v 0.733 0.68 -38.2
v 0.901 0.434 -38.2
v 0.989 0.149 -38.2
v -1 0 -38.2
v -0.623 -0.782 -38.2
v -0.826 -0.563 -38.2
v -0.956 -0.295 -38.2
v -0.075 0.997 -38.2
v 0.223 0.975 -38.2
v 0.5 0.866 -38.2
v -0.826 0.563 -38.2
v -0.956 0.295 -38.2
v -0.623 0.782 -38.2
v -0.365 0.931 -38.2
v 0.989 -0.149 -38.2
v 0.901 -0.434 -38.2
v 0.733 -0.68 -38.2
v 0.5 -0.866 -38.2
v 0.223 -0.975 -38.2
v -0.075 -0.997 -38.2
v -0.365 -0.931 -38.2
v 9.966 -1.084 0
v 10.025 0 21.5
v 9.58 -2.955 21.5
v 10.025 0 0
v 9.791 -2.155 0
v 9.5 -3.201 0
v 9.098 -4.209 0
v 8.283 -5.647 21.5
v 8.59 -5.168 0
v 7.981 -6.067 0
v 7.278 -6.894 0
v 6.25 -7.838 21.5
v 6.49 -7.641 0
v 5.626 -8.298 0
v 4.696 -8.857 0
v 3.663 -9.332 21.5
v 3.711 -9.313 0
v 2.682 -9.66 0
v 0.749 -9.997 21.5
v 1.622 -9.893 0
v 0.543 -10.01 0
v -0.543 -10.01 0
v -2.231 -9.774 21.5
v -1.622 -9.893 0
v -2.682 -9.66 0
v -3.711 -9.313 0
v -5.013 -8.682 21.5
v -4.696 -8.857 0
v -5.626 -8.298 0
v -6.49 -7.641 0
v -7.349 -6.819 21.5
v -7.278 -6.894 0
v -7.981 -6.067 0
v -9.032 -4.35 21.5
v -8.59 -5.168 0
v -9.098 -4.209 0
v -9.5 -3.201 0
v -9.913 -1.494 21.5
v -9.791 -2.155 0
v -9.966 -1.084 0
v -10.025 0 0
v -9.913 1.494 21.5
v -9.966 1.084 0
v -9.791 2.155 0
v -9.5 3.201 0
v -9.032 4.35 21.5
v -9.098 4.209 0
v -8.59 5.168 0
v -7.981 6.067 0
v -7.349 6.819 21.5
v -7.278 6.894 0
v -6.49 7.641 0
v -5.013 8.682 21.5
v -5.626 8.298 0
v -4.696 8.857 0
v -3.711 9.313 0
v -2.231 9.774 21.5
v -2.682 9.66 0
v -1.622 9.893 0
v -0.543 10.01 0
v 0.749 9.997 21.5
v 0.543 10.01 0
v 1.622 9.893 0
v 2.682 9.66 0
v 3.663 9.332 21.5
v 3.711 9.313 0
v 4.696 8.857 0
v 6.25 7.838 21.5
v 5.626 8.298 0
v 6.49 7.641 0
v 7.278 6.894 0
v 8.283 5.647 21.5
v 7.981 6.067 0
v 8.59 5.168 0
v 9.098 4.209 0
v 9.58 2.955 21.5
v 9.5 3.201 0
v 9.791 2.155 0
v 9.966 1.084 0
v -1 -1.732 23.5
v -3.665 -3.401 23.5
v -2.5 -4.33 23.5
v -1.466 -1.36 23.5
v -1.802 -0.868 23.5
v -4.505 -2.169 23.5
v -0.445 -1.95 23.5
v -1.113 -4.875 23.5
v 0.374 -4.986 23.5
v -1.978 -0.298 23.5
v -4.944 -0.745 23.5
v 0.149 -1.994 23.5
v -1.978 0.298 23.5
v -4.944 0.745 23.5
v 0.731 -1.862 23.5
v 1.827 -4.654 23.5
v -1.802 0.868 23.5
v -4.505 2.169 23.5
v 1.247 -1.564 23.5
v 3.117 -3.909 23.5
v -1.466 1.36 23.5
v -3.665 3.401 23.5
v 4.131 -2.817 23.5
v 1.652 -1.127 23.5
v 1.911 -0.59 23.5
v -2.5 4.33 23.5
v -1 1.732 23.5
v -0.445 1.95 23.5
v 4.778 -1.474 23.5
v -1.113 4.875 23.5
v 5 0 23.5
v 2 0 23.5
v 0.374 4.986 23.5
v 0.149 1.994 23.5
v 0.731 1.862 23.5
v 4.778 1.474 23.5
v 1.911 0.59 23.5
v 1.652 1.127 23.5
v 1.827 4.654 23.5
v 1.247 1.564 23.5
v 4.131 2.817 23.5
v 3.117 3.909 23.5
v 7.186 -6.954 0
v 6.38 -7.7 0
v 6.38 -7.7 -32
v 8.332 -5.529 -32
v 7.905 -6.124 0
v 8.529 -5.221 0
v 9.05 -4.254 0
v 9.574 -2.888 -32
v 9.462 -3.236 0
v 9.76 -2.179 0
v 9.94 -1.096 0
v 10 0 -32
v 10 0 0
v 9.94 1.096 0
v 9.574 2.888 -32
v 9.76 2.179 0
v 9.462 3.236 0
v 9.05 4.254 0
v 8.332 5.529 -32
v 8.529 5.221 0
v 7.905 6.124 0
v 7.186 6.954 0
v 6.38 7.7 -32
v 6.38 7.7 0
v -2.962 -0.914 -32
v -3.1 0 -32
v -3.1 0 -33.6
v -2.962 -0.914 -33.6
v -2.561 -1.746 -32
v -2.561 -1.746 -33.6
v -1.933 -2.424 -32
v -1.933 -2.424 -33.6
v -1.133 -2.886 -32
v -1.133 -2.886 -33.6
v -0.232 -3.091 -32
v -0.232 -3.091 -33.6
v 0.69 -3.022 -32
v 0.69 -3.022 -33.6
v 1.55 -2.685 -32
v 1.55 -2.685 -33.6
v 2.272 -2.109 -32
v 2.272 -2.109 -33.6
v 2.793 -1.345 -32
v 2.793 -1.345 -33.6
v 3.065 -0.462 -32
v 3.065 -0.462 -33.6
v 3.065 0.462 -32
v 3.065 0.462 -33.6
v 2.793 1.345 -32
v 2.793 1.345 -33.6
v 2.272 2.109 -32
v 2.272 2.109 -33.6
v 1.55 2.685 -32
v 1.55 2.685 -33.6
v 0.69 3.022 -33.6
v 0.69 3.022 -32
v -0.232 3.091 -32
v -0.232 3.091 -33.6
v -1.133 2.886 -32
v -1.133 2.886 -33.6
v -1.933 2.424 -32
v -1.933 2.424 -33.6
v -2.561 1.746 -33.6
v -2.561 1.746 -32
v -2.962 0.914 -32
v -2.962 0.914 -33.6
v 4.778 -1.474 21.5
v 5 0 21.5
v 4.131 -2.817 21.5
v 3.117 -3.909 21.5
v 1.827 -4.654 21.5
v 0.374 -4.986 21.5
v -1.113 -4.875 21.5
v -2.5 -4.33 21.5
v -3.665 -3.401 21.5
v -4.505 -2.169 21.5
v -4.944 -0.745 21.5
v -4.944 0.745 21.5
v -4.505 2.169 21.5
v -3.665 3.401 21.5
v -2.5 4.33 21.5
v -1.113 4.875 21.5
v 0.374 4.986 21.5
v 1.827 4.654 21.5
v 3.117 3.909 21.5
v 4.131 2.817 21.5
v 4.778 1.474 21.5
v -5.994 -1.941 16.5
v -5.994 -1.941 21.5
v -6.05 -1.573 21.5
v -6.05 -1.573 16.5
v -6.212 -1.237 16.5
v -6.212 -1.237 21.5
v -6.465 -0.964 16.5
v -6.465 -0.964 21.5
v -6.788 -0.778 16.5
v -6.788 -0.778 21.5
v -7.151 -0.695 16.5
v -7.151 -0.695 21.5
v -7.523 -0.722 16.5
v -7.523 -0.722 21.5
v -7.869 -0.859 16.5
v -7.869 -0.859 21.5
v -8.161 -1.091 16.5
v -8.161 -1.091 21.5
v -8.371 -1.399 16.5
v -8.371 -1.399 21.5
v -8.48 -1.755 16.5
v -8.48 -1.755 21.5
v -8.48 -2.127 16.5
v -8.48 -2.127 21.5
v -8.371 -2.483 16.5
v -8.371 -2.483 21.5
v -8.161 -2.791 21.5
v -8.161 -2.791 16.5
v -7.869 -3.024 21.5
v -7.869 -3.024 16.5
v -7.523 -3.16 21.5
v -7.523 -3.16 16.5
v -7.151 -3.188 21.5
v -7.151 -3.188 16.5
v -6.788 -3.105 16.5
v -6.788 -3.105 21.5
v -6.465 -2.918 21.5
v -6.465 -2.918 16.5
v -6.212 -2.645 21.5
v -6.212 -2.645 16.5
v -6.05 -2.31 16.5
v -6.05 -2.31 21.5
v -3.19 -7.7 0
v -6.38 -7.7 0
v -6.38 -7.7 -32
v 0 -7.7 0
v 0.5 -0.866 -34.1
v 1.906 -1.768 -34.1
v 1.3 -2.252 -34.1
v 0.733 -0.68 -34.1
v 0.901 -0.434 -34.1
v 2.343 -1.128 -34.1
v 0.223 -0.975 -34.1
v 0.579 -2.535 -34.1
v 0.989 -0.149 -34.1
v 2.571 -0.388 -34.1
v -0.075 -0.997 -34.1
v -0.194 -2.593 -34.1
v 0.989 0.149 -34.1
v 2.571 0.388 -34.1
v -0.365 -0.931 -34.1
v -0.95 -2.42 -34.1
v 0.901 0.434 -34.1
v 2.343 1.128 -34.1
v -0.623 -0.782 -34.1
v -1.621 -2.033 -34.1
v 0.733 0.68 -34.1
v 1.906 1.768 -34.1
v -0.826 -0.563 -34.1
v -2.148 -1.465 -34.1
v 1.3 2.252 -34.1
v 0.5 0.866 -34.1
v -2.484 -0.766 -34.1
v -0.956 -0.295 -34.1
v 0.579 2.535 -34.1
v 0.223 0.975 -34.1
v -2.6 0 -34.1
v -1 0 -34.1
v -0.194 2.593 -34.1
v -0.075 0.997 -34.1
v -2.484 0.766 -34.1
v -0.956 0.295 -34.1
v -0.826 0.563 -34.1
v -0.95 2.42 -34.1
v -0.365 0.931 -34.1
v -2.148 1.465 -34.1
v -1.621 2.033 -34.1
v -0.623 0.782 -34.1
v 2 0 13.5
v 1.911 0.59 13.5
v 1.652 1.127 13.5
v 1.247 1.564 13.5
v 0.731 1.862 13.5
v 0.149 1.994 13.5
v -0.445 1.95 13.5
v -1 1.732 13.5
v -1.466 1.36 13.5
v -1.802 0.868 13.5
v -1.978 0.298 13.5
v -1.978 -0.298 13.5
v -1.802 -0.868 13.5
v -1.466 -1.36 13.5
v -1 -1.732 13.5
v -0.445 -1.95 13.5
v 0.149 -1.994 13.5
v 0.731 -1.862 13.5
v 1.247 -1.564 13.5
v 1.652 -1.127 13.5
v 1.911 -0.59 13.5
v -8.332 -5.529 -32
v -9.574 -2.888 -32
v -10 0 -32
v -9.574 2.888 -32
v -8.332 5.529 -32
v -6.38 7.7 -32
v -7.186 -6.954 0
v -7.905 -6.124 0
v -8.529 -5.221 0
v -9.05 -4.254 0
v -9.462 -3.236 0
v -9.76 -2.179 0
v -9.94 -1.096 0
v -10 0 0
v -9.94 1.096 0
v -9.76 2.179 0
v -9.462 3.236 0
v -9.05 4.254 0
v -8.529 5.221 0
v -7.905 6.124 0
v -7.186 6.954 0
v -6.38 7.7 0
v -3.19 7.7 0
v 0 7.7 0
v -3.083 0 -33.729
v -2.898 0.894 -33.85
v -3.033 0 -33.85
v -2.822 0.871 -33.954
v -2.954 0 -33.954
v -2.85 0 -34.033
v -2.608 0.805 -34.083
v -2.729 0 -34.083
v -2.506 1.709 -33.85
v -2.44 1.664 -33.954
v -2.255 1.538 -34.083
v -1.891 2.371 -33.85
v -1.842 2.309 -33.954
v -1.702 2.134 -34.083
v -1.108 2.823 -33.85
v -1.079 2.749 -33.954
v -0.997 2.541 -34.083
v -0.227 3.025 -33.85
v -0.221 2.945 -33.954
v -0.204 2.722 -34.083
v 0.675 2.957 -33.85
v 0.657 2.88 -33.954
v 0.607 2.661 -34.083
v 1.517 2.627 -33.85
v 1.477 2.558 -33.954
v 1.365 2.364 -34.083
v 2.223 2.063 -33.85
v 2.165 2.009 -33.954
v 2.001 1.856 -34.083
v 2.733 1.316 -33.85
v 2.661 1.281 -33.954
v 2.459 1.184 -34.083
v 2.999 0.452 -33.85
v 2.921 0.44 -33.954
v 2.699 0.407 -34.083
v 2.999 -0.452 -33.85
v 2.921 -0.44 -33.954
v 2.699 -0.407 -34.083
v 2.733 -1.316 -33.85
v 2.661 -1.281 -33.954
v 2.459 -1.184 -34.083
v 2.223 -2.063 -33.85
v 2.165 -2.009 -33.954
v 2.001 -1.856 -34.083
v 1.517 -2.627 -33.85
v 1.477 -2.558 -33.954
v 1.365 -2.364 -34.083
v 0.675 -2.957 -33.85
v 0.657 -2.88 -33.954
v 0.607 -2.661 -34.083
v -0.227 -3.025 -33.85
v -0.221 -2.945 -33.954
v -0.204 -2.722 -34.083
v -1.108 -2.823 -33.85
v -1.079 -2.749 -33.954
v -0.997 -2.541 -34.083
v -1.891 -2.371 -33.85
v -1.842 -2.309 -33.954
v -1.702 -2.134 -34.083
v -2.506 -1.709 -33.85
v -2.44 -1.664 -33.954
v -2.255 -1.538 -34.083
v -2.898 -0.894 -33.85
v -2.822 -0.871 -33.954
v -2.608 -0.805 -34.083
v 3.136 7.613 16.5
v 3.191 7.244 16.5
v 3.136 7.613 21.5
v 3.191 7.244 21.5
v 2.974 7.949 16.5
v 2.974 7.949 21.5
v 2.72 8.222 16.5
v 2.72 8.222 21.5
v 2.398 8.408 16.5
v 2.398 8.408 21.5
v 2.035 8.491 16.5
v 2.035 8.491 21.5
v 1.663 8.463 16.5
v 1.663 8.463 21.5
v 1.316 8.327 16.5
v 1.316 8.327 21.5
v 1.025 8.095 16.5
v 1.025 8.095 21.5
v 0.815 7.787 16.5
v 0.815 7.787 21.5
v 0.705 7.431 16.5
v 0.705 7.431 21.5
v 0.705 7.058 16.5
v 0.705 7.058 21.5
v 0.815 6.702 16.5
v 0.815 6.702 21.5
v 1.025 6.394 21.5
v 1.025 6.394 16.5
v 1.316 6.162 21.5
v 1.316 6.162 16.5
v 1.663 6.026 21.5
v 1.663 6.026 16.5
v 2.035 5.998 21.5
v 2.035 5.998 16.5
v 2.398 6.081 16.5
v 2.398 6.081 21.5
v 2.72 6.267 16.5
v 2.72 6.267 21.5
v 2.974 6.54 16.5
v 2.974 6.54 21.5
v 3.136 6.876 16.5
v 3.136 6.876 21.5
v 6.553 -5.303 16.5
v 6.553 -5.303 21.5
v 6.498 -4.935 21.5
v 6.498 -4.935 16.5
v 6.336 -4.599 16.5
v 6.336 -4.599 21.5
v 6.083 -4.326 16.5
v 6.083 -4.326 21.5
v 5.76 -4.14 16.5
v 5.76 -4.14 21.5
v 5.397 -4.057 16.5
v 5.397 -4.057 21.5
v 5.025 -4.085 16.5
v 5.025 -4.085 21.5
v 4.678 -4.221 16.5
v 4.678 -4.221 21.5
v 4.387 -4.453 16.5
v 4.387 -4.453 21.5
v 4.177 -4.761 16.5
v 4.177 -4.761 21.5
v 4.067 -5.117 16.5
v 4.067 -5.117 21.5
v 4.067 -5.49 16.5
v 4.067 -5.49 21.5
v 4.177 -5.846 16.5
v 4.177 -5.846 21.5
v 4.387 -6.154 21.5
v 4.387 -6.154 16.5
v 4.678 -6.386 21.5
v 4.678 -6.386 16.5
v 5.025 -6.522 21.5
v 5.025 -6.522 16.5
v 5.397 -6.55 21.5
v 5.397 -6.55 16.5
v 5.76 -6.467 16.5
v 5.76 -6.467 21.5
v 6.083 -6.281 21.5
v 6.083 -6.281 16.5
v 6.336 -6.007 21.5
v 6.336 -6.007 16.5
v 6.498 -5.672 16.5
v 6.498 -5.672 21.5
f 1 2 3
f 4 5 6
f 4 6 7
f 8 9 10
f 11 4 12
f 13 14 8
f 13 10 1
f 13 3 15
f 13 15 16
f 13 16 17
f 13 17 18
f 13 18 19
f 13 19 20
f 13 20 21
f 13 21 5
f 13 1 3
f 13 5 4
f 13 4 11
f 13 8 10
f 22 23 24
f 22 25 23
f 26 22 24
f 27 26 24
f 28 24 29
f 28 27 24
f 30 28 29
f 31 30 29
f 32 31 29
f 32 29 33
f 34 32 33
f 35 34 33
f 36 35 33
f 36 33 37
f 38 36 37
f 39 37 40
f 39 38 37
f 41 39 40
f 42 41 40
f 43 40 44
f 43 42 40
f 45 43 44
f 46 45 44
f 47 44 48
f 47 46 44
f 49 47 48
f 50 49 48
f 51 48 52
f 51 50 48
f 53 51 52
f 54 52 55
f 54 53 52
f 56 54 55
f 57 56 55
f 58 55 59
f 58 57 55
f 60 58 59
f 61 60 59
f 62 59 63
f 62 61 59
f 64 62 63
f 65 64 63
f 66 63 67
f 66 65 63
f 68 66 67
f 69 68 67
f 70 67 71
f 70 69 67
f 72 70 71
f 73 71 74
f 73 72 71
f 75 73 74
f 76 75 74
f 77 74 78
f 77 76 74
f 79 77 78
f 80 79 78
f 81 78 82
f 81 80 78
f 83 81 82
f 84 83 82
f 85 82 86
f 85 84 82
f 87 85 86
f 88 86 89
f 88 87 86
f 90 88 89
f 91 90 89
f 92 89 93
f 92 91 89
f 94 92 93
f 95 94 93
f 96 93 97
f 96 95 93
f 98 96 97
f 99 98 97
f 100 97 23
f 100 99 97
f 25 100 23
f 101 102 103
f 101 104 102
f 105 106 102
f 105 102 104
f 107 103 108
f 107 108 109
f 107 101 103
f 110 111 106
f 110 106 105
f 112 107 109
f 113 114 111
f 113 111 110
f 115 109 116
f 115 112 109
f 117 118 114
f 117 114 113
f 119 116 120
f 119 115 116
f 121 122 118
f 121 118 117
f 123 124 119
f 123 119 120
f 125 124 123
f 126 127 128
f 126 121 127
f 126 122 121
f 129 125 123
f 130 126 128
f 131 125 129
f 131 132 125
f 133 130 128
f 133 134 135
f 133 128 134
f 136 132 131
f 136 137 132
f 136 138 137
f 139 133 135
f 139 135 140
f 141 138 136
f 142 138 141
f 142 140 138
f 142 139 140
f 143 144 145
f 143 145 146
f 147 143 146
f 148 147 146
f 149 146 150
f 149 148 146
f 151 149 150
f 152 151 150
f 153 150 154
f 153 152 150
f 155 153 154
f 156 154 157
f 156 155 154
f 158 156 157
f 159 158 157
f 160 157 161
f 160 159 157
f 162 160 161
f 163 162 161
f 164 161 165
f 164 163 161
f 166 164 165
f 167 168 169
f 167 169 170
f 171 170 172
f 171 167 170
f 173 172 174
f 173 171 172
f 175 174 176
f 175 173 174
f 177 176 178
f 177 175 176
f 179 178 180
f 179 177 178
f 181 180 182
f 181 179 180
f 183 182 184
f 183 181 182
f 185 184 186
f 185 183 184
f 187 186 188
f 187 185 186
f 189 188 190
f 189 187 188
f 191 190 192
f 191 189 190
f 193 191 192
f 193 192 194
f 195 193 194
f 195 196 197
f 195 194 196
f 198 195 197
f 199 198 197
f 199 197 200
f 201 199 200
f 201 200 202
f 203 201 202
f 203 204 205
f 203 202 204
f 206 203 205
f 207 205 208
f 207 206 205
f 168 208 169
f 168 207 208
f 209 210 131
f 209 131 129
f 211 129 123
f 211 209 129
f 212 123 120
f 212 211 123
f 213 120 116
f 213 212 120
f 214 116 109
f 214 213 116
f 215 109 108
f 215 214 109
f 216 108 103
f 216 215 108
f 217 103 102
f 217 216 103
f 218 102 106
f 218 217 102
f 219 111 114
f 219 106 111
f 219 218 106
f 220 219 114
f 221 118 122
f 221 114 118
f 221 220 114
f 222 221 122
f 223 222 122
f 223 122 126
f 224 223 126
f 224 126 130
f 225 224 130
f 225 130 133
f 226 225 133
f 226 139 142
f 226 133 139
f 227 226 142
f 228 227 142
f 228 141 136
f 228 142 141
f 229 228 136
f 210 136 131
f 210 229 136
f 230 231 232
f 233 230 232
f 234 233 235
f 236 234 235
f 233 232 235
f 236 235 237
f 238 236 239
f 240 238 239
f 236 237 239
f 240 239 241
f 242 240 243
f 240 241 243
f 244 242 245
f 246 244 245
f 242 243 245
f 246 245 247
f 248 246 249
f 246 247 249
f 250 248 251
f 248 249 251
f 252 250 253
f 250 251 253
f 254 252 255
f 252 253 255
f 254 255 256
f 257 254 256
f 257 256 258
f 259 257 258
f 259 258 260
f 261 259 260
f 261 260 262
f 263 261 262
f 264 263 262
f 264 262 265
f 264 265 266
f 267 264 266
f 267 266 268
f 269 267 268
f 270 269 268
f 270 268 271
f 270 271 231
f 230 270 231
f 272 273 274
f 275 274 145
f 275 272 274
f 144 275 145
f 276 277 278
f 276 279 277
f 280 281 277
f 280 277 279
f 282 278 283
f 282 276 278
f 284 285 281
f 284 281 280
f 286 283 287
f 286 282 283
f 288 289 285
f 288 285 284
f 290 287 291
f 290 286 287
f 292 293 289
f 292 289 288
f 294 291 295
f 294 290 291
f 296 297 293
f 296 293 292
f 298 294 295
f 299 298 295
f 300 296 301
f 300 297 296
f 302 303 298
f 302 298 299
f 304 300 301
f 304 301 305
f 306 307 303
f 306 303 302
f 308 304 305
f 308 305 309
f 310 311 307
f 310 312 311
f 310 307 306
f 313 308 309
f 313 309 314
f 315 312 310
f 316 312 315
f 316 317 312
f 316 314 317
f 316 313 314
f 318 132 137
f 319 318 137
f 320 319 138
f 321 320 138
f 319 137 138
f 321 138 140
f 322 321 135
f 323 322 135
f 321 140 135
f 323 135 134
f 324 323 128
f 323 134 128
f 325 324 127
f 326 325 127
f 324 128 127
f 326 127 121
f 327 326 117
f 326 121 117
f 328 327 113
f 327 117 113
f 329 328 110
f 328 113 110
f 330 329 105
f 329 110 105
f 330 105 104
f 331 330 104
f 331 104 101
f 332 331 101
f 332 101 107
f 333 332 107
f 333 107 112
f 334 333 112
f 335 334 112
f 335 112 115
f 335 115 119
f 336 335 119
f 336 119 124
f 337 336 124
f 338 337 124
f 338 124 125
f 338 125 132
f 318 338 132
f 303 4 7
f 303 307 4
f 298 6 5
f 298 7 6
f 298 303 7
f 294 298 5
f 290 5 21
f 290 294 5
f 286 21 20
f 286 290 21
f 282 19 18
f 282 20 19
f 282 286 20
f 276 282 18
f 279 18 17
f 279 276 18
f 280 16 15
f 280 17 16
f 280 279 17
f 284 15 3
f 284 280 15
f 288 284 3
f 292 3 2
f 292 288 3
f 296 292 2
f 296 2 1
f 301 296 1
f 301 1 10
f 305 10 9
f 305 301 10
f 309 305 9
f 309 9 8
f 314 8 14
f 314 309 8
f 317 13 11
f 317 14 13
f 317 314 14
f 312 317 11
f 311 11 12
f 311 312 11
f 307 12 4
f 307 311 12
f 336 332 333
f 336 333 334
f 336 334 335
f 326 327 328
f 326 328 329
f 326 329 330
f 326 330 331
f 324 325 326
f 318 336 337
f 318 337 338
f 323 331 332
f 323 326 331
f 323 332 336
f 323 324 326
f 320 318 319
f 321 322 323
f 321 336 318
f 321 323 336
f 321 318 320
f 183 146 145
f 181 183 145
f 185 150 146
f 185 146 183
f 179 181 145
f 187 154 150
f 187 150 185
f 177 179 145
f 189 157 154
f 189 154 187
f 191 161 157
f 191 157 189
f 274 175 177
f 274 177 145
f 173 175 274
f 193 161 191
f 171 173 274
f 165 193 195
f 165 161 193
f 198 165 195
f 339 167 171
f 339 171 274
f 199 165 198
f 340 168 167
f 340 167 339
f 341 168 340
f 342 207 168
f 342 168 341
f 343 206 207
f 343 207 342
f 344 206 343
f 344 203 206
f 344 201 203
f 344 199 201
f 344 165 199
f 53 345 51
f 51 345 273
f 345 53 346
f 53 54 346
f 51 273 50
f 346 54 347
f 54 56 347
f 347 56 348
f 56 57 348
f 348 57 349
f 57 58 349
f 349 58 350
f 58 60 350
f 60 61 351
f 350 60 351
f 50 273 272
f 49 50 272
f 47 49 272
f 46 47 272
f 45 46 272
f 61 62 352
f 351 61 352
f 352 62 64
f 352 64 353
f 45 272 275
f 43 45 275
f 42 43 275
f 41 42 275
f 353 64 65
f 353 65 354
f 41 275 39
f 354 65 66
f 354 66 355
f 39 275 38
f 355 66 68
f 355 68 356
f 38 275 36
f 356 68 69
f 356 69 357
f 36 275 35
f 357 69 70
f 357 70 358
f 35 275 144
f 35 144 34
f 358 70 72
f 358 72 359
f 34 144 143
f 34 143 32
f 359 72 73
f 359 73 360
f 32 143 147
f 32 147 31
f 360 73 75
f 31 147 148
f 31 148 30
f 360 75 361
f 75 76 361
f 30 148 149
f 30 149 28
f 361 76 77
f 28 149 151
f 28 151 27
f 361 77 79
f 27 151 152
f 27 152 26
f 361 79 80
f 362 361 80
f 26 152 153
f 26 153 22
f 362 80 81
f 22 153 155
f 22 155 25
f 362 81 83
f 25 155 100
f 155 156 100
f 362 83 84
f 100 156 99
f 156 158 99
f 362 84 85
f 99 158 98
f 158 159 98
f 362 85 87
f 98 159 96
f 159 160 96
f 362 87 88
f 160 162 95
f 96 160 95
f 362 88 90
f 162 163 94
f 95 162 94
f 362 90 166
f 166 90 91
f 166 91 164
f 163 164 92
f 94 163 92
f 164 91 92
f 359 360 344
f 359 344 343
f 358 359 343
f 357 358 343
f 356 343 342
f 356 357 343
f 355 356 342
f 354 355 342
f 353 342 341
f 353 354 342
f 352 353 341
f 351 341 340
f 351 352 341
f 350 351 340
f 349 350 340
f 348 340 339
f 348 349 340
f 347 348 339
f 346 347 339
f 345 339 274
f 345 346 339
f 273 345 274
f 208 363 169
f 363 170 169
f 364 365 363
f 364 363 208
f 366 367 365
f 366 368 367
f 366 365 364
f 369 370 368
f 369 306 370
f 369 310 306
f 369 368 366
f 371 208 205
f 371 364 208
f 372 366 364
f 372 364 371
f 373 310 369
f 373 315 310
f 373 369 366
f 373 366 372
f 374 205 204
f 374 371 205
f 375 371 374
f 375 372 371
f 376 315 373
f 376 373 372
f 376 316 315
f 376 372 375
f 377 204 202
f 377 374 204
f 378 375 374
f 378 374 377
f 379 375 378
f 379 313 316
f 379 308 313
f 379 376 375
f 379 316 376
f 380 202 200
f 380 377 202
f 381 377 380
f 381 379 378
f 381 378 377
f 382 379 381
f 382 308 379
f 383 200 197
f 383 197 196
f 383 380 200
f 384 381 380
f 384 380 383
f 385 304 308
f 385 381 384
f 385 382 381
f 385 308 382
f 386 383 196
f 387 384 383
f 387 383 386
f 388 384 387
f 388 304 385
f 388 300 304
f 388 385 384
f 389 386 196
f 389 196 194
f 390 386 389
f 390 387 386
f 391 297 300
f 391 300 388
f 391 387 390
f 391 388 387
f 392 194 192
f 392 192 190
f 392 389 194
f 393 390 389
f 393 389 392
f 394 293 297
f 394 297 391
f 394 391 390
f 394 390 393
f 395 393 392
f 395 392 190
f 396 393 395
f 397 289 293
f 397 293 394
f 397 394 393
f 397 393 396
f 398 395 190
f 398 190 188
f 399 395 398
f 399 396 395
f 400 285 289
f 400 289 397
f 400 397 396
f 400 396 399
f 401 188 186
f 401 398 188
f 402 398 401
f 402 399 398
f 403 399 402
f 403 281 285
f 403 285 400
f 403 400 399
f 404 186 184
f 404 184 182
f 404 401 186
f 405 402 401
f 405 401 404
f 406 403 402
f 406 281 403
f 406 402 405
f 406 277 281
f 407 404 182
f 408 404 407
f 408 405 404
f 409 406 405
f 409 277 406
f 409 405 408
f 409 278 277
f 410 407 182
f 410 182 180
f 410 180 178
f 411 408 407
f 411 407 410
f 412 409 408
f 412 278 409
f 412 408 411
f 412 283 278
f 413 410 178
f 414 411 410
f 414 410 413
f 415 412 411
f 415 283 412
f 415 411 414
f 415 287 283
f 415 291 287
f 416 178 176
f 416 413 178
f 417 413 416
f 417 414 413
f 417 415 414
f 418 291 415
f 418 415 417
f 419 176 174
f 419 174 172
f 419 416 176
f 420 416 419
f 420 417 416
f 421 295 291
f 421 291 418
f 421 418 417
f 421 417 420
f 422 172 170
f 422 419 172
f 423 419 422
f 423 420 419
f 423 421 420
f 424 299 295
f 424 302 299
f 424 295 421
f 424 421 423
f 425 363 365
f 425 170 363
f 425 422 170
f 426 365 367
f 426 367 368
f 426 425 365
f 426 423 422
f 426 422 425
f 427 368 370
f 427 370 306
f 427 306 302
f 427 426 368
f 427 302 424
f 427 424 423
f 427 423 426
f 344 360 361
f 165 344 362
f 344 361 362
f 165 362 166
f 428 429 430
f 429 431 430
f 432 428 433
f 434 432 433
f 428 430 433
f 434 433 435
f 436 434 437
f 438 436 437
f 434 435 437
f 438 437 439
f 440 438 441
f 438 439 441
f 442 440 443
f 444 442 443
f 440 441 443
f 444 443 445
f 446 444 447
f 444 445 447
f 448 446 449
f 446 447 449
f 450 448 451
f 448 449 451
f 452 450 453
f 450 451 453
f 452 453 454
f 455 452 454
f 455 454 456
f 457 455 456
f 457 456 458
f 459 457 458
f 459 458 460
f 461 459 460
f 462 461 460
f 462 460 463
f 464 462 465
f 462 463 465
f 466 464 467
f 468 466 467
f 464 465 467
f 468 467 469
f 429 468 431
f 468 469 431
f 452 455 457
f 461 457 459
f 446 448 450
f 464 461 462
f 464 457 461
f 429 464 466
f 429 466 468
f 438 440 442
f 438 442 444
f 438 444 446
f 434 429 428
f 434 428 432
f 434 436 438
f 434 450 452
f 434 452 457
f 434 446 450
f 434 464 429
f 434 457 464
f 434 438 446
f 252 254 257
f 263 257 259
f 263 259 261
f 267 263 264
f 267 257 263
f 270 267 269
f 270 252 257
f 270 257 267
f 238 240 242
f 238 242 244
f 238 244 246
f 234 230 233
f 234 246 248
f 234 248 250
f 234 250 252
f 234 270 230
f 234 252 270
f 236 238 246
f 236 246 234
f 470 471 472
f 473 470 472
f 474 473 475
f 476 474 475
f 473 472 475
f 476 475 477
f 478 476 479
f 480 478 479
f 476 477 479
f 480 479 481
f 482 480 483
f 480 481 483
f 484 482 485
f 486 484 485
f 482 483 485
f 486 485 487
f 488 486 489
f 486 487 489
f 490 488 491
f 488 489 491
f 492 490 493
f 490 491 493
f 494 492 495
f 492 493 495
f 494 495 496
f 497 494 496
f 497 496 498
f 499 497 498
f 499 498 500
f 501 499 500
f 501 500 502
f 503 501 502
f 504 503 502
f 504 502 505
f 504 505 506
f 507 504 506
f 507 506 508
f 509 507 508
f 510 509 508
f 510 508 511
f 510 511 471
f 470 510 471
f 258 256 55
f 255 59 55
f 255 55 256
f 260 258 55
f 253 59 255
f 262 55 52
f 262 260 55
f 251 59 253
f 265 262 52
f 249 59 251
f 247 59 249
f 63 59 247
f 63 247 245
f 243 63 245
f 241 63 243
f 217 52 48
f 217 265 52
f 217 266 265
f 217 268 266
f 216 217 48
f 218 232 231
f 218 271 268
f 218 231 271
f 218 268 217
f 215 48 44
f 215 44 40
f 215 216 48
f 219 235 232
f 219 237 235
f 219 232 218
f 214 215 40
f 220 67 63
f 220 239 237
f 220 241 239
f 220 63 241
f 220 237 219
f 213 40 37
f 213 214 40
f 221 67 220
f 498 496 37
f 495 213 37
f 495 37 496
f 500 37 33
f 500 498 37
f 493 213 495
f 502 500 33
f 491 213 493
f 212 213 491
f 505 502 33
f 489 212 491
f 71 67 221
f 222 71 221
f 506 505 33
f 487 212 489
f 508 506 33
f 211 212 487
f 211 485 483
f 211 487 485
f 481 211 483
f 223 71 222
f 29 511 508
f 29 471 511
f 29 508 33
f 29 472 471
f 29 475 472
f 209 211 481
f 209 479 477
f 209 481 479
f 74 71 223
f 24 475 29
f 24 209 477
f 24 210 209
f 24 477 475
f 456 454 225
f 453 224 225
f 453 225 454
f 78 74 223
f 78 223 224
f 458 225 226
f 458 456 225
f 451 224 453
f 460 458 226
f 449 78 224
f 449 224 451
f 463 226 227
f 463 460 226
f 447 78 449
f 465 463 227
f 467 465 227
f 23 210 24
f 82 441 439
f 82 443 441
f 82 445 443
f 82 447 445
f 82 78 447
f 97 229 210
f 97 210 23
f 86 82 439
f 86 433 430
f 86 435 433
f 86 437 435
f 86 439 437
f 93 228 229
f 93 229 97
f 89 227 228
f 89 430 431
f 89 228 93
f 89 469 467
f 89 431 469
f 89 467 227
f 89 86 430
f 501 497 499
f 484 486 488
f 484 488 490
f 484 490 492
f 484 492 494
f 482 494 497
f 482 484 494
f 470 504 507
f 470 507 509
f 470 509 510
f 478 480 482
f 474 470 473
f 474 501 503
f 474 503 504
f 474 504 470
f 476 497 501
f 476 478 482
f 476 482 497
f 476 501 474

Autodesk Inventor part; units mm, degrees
ref_plane "YZ Plane" through (0, 0, 0) normal (1, 0, 0) x (0, 1, 0)
ref_plane "XZ Plane" through (0, 0, 0) normal (0, 1, 0) x (-1, 0, 0)
ref_plane "XY Plane" through (0, 0, 0) normal (0, 0, 1) x (1, 0, 0)
sketch "Эскиз1" plane through (0, 0, 0) normal (0, 0, 1) x (1, 0, 0)
  circle A0 centre (0, 0) radius 10.025
  dimension "d0" = 20.05
extrude "Выдавливание1" add sketch "Эскиз1" along normal blind 21.5
sketch "Эскиз2" plane through (0, 0, 21.5) normal (0, 0, 1) x (1, 0, 0)
  circle A0 centre (0, 0) radius 5
  dimension "d3" = 10
extrude "Выдавливание2" add sketch "Эскиз2" along normal blind 2
sketch "Эскиз3" plane through (0, 0, 0) normal (0, 0, -1) x (-1, 0, 0)
  circle A0 centre (0, 0) radius 10
  line L0 (6.3804, -7.7) -> (-6.4196, -7.7)
  circle A1 centre (0, 0) radius 10.025 construction
  line L1 (-10.025, 0) -> (10.025, 0) construction
  circle A2 centre (0, 0) radius 10.025 construction
  line L2 (6.3804, 7.7) -> (-6.4196, 7.7)
  point P0 (-6.3804, 7.7)
  point P1 (-6.3804, -7.7)
  dimension "d6" = 20
  dimension "d10" = 15.4
extrude "Выдавливание3" add sketch "Эскиз3" along normal blind 32 contours A0 L0 L2
sketch "Эскиз4" plane through (0, 0, 21.5) normal (0, 0, 1) x (1, 0, 0)
  circle A0 centre (0, 0) radius 7.5 construction
  circle A1 centre (1.9411, 7.2444) radius 1.25
  circle A2 centre (0, 0) radius 10.025 construction
  line L0 (0, 10.025) -> (0, -10.025) construction
  line L1 (1.9411, 7.2444) -> (0, 0) construction
  circle A3 centre (-7.2444, -1.9411) radius 1.25
  circle A4 centre (5.3033, -5.3033) radius 1.25
  dimension "d11" = 15
  dimension "d12" = 2.5
  dimension "d13" = 15
  dimension "d16" = 360
extrude "Выдавливание4" cut sketch "Эскиз4" against normal blind 5
sketch "Эскиз5" plane through (0, 0, -32) normal (0, 0, -1) x (-1, 0, 0)
  circle A0 centre (0, 0) radius 3.1
  dimension "d20" = 6.2
extrude "Выдавливание5" add sketch "Эскиз5" along normal blind 2.1
fillet "Сопряжение1" radius 0.5 1 edges at (3.1, 0, -34.1)
sketch "Эскиз6" plane through (0, 0, -34.1) normal (0, 0, -1) x (-1, 0, 0)
  circle A0 centre (0, 0) radius 1
  dimension "d24" = 2
extrude "Выдавливание6" add sketch "Эскиз6" along normal blind 4.1
sketch "Эскиз7" plane through (0, 0, 23.5) normal (0, 0, 1) x (1, 0, 0)
  circle A0 centre (0, 0) radius 2
  dimension "d27" = 4
extrude "Выдавливание7" cut sketch "Эскиз7" against normal blind 10
properties part number "motor_body"
